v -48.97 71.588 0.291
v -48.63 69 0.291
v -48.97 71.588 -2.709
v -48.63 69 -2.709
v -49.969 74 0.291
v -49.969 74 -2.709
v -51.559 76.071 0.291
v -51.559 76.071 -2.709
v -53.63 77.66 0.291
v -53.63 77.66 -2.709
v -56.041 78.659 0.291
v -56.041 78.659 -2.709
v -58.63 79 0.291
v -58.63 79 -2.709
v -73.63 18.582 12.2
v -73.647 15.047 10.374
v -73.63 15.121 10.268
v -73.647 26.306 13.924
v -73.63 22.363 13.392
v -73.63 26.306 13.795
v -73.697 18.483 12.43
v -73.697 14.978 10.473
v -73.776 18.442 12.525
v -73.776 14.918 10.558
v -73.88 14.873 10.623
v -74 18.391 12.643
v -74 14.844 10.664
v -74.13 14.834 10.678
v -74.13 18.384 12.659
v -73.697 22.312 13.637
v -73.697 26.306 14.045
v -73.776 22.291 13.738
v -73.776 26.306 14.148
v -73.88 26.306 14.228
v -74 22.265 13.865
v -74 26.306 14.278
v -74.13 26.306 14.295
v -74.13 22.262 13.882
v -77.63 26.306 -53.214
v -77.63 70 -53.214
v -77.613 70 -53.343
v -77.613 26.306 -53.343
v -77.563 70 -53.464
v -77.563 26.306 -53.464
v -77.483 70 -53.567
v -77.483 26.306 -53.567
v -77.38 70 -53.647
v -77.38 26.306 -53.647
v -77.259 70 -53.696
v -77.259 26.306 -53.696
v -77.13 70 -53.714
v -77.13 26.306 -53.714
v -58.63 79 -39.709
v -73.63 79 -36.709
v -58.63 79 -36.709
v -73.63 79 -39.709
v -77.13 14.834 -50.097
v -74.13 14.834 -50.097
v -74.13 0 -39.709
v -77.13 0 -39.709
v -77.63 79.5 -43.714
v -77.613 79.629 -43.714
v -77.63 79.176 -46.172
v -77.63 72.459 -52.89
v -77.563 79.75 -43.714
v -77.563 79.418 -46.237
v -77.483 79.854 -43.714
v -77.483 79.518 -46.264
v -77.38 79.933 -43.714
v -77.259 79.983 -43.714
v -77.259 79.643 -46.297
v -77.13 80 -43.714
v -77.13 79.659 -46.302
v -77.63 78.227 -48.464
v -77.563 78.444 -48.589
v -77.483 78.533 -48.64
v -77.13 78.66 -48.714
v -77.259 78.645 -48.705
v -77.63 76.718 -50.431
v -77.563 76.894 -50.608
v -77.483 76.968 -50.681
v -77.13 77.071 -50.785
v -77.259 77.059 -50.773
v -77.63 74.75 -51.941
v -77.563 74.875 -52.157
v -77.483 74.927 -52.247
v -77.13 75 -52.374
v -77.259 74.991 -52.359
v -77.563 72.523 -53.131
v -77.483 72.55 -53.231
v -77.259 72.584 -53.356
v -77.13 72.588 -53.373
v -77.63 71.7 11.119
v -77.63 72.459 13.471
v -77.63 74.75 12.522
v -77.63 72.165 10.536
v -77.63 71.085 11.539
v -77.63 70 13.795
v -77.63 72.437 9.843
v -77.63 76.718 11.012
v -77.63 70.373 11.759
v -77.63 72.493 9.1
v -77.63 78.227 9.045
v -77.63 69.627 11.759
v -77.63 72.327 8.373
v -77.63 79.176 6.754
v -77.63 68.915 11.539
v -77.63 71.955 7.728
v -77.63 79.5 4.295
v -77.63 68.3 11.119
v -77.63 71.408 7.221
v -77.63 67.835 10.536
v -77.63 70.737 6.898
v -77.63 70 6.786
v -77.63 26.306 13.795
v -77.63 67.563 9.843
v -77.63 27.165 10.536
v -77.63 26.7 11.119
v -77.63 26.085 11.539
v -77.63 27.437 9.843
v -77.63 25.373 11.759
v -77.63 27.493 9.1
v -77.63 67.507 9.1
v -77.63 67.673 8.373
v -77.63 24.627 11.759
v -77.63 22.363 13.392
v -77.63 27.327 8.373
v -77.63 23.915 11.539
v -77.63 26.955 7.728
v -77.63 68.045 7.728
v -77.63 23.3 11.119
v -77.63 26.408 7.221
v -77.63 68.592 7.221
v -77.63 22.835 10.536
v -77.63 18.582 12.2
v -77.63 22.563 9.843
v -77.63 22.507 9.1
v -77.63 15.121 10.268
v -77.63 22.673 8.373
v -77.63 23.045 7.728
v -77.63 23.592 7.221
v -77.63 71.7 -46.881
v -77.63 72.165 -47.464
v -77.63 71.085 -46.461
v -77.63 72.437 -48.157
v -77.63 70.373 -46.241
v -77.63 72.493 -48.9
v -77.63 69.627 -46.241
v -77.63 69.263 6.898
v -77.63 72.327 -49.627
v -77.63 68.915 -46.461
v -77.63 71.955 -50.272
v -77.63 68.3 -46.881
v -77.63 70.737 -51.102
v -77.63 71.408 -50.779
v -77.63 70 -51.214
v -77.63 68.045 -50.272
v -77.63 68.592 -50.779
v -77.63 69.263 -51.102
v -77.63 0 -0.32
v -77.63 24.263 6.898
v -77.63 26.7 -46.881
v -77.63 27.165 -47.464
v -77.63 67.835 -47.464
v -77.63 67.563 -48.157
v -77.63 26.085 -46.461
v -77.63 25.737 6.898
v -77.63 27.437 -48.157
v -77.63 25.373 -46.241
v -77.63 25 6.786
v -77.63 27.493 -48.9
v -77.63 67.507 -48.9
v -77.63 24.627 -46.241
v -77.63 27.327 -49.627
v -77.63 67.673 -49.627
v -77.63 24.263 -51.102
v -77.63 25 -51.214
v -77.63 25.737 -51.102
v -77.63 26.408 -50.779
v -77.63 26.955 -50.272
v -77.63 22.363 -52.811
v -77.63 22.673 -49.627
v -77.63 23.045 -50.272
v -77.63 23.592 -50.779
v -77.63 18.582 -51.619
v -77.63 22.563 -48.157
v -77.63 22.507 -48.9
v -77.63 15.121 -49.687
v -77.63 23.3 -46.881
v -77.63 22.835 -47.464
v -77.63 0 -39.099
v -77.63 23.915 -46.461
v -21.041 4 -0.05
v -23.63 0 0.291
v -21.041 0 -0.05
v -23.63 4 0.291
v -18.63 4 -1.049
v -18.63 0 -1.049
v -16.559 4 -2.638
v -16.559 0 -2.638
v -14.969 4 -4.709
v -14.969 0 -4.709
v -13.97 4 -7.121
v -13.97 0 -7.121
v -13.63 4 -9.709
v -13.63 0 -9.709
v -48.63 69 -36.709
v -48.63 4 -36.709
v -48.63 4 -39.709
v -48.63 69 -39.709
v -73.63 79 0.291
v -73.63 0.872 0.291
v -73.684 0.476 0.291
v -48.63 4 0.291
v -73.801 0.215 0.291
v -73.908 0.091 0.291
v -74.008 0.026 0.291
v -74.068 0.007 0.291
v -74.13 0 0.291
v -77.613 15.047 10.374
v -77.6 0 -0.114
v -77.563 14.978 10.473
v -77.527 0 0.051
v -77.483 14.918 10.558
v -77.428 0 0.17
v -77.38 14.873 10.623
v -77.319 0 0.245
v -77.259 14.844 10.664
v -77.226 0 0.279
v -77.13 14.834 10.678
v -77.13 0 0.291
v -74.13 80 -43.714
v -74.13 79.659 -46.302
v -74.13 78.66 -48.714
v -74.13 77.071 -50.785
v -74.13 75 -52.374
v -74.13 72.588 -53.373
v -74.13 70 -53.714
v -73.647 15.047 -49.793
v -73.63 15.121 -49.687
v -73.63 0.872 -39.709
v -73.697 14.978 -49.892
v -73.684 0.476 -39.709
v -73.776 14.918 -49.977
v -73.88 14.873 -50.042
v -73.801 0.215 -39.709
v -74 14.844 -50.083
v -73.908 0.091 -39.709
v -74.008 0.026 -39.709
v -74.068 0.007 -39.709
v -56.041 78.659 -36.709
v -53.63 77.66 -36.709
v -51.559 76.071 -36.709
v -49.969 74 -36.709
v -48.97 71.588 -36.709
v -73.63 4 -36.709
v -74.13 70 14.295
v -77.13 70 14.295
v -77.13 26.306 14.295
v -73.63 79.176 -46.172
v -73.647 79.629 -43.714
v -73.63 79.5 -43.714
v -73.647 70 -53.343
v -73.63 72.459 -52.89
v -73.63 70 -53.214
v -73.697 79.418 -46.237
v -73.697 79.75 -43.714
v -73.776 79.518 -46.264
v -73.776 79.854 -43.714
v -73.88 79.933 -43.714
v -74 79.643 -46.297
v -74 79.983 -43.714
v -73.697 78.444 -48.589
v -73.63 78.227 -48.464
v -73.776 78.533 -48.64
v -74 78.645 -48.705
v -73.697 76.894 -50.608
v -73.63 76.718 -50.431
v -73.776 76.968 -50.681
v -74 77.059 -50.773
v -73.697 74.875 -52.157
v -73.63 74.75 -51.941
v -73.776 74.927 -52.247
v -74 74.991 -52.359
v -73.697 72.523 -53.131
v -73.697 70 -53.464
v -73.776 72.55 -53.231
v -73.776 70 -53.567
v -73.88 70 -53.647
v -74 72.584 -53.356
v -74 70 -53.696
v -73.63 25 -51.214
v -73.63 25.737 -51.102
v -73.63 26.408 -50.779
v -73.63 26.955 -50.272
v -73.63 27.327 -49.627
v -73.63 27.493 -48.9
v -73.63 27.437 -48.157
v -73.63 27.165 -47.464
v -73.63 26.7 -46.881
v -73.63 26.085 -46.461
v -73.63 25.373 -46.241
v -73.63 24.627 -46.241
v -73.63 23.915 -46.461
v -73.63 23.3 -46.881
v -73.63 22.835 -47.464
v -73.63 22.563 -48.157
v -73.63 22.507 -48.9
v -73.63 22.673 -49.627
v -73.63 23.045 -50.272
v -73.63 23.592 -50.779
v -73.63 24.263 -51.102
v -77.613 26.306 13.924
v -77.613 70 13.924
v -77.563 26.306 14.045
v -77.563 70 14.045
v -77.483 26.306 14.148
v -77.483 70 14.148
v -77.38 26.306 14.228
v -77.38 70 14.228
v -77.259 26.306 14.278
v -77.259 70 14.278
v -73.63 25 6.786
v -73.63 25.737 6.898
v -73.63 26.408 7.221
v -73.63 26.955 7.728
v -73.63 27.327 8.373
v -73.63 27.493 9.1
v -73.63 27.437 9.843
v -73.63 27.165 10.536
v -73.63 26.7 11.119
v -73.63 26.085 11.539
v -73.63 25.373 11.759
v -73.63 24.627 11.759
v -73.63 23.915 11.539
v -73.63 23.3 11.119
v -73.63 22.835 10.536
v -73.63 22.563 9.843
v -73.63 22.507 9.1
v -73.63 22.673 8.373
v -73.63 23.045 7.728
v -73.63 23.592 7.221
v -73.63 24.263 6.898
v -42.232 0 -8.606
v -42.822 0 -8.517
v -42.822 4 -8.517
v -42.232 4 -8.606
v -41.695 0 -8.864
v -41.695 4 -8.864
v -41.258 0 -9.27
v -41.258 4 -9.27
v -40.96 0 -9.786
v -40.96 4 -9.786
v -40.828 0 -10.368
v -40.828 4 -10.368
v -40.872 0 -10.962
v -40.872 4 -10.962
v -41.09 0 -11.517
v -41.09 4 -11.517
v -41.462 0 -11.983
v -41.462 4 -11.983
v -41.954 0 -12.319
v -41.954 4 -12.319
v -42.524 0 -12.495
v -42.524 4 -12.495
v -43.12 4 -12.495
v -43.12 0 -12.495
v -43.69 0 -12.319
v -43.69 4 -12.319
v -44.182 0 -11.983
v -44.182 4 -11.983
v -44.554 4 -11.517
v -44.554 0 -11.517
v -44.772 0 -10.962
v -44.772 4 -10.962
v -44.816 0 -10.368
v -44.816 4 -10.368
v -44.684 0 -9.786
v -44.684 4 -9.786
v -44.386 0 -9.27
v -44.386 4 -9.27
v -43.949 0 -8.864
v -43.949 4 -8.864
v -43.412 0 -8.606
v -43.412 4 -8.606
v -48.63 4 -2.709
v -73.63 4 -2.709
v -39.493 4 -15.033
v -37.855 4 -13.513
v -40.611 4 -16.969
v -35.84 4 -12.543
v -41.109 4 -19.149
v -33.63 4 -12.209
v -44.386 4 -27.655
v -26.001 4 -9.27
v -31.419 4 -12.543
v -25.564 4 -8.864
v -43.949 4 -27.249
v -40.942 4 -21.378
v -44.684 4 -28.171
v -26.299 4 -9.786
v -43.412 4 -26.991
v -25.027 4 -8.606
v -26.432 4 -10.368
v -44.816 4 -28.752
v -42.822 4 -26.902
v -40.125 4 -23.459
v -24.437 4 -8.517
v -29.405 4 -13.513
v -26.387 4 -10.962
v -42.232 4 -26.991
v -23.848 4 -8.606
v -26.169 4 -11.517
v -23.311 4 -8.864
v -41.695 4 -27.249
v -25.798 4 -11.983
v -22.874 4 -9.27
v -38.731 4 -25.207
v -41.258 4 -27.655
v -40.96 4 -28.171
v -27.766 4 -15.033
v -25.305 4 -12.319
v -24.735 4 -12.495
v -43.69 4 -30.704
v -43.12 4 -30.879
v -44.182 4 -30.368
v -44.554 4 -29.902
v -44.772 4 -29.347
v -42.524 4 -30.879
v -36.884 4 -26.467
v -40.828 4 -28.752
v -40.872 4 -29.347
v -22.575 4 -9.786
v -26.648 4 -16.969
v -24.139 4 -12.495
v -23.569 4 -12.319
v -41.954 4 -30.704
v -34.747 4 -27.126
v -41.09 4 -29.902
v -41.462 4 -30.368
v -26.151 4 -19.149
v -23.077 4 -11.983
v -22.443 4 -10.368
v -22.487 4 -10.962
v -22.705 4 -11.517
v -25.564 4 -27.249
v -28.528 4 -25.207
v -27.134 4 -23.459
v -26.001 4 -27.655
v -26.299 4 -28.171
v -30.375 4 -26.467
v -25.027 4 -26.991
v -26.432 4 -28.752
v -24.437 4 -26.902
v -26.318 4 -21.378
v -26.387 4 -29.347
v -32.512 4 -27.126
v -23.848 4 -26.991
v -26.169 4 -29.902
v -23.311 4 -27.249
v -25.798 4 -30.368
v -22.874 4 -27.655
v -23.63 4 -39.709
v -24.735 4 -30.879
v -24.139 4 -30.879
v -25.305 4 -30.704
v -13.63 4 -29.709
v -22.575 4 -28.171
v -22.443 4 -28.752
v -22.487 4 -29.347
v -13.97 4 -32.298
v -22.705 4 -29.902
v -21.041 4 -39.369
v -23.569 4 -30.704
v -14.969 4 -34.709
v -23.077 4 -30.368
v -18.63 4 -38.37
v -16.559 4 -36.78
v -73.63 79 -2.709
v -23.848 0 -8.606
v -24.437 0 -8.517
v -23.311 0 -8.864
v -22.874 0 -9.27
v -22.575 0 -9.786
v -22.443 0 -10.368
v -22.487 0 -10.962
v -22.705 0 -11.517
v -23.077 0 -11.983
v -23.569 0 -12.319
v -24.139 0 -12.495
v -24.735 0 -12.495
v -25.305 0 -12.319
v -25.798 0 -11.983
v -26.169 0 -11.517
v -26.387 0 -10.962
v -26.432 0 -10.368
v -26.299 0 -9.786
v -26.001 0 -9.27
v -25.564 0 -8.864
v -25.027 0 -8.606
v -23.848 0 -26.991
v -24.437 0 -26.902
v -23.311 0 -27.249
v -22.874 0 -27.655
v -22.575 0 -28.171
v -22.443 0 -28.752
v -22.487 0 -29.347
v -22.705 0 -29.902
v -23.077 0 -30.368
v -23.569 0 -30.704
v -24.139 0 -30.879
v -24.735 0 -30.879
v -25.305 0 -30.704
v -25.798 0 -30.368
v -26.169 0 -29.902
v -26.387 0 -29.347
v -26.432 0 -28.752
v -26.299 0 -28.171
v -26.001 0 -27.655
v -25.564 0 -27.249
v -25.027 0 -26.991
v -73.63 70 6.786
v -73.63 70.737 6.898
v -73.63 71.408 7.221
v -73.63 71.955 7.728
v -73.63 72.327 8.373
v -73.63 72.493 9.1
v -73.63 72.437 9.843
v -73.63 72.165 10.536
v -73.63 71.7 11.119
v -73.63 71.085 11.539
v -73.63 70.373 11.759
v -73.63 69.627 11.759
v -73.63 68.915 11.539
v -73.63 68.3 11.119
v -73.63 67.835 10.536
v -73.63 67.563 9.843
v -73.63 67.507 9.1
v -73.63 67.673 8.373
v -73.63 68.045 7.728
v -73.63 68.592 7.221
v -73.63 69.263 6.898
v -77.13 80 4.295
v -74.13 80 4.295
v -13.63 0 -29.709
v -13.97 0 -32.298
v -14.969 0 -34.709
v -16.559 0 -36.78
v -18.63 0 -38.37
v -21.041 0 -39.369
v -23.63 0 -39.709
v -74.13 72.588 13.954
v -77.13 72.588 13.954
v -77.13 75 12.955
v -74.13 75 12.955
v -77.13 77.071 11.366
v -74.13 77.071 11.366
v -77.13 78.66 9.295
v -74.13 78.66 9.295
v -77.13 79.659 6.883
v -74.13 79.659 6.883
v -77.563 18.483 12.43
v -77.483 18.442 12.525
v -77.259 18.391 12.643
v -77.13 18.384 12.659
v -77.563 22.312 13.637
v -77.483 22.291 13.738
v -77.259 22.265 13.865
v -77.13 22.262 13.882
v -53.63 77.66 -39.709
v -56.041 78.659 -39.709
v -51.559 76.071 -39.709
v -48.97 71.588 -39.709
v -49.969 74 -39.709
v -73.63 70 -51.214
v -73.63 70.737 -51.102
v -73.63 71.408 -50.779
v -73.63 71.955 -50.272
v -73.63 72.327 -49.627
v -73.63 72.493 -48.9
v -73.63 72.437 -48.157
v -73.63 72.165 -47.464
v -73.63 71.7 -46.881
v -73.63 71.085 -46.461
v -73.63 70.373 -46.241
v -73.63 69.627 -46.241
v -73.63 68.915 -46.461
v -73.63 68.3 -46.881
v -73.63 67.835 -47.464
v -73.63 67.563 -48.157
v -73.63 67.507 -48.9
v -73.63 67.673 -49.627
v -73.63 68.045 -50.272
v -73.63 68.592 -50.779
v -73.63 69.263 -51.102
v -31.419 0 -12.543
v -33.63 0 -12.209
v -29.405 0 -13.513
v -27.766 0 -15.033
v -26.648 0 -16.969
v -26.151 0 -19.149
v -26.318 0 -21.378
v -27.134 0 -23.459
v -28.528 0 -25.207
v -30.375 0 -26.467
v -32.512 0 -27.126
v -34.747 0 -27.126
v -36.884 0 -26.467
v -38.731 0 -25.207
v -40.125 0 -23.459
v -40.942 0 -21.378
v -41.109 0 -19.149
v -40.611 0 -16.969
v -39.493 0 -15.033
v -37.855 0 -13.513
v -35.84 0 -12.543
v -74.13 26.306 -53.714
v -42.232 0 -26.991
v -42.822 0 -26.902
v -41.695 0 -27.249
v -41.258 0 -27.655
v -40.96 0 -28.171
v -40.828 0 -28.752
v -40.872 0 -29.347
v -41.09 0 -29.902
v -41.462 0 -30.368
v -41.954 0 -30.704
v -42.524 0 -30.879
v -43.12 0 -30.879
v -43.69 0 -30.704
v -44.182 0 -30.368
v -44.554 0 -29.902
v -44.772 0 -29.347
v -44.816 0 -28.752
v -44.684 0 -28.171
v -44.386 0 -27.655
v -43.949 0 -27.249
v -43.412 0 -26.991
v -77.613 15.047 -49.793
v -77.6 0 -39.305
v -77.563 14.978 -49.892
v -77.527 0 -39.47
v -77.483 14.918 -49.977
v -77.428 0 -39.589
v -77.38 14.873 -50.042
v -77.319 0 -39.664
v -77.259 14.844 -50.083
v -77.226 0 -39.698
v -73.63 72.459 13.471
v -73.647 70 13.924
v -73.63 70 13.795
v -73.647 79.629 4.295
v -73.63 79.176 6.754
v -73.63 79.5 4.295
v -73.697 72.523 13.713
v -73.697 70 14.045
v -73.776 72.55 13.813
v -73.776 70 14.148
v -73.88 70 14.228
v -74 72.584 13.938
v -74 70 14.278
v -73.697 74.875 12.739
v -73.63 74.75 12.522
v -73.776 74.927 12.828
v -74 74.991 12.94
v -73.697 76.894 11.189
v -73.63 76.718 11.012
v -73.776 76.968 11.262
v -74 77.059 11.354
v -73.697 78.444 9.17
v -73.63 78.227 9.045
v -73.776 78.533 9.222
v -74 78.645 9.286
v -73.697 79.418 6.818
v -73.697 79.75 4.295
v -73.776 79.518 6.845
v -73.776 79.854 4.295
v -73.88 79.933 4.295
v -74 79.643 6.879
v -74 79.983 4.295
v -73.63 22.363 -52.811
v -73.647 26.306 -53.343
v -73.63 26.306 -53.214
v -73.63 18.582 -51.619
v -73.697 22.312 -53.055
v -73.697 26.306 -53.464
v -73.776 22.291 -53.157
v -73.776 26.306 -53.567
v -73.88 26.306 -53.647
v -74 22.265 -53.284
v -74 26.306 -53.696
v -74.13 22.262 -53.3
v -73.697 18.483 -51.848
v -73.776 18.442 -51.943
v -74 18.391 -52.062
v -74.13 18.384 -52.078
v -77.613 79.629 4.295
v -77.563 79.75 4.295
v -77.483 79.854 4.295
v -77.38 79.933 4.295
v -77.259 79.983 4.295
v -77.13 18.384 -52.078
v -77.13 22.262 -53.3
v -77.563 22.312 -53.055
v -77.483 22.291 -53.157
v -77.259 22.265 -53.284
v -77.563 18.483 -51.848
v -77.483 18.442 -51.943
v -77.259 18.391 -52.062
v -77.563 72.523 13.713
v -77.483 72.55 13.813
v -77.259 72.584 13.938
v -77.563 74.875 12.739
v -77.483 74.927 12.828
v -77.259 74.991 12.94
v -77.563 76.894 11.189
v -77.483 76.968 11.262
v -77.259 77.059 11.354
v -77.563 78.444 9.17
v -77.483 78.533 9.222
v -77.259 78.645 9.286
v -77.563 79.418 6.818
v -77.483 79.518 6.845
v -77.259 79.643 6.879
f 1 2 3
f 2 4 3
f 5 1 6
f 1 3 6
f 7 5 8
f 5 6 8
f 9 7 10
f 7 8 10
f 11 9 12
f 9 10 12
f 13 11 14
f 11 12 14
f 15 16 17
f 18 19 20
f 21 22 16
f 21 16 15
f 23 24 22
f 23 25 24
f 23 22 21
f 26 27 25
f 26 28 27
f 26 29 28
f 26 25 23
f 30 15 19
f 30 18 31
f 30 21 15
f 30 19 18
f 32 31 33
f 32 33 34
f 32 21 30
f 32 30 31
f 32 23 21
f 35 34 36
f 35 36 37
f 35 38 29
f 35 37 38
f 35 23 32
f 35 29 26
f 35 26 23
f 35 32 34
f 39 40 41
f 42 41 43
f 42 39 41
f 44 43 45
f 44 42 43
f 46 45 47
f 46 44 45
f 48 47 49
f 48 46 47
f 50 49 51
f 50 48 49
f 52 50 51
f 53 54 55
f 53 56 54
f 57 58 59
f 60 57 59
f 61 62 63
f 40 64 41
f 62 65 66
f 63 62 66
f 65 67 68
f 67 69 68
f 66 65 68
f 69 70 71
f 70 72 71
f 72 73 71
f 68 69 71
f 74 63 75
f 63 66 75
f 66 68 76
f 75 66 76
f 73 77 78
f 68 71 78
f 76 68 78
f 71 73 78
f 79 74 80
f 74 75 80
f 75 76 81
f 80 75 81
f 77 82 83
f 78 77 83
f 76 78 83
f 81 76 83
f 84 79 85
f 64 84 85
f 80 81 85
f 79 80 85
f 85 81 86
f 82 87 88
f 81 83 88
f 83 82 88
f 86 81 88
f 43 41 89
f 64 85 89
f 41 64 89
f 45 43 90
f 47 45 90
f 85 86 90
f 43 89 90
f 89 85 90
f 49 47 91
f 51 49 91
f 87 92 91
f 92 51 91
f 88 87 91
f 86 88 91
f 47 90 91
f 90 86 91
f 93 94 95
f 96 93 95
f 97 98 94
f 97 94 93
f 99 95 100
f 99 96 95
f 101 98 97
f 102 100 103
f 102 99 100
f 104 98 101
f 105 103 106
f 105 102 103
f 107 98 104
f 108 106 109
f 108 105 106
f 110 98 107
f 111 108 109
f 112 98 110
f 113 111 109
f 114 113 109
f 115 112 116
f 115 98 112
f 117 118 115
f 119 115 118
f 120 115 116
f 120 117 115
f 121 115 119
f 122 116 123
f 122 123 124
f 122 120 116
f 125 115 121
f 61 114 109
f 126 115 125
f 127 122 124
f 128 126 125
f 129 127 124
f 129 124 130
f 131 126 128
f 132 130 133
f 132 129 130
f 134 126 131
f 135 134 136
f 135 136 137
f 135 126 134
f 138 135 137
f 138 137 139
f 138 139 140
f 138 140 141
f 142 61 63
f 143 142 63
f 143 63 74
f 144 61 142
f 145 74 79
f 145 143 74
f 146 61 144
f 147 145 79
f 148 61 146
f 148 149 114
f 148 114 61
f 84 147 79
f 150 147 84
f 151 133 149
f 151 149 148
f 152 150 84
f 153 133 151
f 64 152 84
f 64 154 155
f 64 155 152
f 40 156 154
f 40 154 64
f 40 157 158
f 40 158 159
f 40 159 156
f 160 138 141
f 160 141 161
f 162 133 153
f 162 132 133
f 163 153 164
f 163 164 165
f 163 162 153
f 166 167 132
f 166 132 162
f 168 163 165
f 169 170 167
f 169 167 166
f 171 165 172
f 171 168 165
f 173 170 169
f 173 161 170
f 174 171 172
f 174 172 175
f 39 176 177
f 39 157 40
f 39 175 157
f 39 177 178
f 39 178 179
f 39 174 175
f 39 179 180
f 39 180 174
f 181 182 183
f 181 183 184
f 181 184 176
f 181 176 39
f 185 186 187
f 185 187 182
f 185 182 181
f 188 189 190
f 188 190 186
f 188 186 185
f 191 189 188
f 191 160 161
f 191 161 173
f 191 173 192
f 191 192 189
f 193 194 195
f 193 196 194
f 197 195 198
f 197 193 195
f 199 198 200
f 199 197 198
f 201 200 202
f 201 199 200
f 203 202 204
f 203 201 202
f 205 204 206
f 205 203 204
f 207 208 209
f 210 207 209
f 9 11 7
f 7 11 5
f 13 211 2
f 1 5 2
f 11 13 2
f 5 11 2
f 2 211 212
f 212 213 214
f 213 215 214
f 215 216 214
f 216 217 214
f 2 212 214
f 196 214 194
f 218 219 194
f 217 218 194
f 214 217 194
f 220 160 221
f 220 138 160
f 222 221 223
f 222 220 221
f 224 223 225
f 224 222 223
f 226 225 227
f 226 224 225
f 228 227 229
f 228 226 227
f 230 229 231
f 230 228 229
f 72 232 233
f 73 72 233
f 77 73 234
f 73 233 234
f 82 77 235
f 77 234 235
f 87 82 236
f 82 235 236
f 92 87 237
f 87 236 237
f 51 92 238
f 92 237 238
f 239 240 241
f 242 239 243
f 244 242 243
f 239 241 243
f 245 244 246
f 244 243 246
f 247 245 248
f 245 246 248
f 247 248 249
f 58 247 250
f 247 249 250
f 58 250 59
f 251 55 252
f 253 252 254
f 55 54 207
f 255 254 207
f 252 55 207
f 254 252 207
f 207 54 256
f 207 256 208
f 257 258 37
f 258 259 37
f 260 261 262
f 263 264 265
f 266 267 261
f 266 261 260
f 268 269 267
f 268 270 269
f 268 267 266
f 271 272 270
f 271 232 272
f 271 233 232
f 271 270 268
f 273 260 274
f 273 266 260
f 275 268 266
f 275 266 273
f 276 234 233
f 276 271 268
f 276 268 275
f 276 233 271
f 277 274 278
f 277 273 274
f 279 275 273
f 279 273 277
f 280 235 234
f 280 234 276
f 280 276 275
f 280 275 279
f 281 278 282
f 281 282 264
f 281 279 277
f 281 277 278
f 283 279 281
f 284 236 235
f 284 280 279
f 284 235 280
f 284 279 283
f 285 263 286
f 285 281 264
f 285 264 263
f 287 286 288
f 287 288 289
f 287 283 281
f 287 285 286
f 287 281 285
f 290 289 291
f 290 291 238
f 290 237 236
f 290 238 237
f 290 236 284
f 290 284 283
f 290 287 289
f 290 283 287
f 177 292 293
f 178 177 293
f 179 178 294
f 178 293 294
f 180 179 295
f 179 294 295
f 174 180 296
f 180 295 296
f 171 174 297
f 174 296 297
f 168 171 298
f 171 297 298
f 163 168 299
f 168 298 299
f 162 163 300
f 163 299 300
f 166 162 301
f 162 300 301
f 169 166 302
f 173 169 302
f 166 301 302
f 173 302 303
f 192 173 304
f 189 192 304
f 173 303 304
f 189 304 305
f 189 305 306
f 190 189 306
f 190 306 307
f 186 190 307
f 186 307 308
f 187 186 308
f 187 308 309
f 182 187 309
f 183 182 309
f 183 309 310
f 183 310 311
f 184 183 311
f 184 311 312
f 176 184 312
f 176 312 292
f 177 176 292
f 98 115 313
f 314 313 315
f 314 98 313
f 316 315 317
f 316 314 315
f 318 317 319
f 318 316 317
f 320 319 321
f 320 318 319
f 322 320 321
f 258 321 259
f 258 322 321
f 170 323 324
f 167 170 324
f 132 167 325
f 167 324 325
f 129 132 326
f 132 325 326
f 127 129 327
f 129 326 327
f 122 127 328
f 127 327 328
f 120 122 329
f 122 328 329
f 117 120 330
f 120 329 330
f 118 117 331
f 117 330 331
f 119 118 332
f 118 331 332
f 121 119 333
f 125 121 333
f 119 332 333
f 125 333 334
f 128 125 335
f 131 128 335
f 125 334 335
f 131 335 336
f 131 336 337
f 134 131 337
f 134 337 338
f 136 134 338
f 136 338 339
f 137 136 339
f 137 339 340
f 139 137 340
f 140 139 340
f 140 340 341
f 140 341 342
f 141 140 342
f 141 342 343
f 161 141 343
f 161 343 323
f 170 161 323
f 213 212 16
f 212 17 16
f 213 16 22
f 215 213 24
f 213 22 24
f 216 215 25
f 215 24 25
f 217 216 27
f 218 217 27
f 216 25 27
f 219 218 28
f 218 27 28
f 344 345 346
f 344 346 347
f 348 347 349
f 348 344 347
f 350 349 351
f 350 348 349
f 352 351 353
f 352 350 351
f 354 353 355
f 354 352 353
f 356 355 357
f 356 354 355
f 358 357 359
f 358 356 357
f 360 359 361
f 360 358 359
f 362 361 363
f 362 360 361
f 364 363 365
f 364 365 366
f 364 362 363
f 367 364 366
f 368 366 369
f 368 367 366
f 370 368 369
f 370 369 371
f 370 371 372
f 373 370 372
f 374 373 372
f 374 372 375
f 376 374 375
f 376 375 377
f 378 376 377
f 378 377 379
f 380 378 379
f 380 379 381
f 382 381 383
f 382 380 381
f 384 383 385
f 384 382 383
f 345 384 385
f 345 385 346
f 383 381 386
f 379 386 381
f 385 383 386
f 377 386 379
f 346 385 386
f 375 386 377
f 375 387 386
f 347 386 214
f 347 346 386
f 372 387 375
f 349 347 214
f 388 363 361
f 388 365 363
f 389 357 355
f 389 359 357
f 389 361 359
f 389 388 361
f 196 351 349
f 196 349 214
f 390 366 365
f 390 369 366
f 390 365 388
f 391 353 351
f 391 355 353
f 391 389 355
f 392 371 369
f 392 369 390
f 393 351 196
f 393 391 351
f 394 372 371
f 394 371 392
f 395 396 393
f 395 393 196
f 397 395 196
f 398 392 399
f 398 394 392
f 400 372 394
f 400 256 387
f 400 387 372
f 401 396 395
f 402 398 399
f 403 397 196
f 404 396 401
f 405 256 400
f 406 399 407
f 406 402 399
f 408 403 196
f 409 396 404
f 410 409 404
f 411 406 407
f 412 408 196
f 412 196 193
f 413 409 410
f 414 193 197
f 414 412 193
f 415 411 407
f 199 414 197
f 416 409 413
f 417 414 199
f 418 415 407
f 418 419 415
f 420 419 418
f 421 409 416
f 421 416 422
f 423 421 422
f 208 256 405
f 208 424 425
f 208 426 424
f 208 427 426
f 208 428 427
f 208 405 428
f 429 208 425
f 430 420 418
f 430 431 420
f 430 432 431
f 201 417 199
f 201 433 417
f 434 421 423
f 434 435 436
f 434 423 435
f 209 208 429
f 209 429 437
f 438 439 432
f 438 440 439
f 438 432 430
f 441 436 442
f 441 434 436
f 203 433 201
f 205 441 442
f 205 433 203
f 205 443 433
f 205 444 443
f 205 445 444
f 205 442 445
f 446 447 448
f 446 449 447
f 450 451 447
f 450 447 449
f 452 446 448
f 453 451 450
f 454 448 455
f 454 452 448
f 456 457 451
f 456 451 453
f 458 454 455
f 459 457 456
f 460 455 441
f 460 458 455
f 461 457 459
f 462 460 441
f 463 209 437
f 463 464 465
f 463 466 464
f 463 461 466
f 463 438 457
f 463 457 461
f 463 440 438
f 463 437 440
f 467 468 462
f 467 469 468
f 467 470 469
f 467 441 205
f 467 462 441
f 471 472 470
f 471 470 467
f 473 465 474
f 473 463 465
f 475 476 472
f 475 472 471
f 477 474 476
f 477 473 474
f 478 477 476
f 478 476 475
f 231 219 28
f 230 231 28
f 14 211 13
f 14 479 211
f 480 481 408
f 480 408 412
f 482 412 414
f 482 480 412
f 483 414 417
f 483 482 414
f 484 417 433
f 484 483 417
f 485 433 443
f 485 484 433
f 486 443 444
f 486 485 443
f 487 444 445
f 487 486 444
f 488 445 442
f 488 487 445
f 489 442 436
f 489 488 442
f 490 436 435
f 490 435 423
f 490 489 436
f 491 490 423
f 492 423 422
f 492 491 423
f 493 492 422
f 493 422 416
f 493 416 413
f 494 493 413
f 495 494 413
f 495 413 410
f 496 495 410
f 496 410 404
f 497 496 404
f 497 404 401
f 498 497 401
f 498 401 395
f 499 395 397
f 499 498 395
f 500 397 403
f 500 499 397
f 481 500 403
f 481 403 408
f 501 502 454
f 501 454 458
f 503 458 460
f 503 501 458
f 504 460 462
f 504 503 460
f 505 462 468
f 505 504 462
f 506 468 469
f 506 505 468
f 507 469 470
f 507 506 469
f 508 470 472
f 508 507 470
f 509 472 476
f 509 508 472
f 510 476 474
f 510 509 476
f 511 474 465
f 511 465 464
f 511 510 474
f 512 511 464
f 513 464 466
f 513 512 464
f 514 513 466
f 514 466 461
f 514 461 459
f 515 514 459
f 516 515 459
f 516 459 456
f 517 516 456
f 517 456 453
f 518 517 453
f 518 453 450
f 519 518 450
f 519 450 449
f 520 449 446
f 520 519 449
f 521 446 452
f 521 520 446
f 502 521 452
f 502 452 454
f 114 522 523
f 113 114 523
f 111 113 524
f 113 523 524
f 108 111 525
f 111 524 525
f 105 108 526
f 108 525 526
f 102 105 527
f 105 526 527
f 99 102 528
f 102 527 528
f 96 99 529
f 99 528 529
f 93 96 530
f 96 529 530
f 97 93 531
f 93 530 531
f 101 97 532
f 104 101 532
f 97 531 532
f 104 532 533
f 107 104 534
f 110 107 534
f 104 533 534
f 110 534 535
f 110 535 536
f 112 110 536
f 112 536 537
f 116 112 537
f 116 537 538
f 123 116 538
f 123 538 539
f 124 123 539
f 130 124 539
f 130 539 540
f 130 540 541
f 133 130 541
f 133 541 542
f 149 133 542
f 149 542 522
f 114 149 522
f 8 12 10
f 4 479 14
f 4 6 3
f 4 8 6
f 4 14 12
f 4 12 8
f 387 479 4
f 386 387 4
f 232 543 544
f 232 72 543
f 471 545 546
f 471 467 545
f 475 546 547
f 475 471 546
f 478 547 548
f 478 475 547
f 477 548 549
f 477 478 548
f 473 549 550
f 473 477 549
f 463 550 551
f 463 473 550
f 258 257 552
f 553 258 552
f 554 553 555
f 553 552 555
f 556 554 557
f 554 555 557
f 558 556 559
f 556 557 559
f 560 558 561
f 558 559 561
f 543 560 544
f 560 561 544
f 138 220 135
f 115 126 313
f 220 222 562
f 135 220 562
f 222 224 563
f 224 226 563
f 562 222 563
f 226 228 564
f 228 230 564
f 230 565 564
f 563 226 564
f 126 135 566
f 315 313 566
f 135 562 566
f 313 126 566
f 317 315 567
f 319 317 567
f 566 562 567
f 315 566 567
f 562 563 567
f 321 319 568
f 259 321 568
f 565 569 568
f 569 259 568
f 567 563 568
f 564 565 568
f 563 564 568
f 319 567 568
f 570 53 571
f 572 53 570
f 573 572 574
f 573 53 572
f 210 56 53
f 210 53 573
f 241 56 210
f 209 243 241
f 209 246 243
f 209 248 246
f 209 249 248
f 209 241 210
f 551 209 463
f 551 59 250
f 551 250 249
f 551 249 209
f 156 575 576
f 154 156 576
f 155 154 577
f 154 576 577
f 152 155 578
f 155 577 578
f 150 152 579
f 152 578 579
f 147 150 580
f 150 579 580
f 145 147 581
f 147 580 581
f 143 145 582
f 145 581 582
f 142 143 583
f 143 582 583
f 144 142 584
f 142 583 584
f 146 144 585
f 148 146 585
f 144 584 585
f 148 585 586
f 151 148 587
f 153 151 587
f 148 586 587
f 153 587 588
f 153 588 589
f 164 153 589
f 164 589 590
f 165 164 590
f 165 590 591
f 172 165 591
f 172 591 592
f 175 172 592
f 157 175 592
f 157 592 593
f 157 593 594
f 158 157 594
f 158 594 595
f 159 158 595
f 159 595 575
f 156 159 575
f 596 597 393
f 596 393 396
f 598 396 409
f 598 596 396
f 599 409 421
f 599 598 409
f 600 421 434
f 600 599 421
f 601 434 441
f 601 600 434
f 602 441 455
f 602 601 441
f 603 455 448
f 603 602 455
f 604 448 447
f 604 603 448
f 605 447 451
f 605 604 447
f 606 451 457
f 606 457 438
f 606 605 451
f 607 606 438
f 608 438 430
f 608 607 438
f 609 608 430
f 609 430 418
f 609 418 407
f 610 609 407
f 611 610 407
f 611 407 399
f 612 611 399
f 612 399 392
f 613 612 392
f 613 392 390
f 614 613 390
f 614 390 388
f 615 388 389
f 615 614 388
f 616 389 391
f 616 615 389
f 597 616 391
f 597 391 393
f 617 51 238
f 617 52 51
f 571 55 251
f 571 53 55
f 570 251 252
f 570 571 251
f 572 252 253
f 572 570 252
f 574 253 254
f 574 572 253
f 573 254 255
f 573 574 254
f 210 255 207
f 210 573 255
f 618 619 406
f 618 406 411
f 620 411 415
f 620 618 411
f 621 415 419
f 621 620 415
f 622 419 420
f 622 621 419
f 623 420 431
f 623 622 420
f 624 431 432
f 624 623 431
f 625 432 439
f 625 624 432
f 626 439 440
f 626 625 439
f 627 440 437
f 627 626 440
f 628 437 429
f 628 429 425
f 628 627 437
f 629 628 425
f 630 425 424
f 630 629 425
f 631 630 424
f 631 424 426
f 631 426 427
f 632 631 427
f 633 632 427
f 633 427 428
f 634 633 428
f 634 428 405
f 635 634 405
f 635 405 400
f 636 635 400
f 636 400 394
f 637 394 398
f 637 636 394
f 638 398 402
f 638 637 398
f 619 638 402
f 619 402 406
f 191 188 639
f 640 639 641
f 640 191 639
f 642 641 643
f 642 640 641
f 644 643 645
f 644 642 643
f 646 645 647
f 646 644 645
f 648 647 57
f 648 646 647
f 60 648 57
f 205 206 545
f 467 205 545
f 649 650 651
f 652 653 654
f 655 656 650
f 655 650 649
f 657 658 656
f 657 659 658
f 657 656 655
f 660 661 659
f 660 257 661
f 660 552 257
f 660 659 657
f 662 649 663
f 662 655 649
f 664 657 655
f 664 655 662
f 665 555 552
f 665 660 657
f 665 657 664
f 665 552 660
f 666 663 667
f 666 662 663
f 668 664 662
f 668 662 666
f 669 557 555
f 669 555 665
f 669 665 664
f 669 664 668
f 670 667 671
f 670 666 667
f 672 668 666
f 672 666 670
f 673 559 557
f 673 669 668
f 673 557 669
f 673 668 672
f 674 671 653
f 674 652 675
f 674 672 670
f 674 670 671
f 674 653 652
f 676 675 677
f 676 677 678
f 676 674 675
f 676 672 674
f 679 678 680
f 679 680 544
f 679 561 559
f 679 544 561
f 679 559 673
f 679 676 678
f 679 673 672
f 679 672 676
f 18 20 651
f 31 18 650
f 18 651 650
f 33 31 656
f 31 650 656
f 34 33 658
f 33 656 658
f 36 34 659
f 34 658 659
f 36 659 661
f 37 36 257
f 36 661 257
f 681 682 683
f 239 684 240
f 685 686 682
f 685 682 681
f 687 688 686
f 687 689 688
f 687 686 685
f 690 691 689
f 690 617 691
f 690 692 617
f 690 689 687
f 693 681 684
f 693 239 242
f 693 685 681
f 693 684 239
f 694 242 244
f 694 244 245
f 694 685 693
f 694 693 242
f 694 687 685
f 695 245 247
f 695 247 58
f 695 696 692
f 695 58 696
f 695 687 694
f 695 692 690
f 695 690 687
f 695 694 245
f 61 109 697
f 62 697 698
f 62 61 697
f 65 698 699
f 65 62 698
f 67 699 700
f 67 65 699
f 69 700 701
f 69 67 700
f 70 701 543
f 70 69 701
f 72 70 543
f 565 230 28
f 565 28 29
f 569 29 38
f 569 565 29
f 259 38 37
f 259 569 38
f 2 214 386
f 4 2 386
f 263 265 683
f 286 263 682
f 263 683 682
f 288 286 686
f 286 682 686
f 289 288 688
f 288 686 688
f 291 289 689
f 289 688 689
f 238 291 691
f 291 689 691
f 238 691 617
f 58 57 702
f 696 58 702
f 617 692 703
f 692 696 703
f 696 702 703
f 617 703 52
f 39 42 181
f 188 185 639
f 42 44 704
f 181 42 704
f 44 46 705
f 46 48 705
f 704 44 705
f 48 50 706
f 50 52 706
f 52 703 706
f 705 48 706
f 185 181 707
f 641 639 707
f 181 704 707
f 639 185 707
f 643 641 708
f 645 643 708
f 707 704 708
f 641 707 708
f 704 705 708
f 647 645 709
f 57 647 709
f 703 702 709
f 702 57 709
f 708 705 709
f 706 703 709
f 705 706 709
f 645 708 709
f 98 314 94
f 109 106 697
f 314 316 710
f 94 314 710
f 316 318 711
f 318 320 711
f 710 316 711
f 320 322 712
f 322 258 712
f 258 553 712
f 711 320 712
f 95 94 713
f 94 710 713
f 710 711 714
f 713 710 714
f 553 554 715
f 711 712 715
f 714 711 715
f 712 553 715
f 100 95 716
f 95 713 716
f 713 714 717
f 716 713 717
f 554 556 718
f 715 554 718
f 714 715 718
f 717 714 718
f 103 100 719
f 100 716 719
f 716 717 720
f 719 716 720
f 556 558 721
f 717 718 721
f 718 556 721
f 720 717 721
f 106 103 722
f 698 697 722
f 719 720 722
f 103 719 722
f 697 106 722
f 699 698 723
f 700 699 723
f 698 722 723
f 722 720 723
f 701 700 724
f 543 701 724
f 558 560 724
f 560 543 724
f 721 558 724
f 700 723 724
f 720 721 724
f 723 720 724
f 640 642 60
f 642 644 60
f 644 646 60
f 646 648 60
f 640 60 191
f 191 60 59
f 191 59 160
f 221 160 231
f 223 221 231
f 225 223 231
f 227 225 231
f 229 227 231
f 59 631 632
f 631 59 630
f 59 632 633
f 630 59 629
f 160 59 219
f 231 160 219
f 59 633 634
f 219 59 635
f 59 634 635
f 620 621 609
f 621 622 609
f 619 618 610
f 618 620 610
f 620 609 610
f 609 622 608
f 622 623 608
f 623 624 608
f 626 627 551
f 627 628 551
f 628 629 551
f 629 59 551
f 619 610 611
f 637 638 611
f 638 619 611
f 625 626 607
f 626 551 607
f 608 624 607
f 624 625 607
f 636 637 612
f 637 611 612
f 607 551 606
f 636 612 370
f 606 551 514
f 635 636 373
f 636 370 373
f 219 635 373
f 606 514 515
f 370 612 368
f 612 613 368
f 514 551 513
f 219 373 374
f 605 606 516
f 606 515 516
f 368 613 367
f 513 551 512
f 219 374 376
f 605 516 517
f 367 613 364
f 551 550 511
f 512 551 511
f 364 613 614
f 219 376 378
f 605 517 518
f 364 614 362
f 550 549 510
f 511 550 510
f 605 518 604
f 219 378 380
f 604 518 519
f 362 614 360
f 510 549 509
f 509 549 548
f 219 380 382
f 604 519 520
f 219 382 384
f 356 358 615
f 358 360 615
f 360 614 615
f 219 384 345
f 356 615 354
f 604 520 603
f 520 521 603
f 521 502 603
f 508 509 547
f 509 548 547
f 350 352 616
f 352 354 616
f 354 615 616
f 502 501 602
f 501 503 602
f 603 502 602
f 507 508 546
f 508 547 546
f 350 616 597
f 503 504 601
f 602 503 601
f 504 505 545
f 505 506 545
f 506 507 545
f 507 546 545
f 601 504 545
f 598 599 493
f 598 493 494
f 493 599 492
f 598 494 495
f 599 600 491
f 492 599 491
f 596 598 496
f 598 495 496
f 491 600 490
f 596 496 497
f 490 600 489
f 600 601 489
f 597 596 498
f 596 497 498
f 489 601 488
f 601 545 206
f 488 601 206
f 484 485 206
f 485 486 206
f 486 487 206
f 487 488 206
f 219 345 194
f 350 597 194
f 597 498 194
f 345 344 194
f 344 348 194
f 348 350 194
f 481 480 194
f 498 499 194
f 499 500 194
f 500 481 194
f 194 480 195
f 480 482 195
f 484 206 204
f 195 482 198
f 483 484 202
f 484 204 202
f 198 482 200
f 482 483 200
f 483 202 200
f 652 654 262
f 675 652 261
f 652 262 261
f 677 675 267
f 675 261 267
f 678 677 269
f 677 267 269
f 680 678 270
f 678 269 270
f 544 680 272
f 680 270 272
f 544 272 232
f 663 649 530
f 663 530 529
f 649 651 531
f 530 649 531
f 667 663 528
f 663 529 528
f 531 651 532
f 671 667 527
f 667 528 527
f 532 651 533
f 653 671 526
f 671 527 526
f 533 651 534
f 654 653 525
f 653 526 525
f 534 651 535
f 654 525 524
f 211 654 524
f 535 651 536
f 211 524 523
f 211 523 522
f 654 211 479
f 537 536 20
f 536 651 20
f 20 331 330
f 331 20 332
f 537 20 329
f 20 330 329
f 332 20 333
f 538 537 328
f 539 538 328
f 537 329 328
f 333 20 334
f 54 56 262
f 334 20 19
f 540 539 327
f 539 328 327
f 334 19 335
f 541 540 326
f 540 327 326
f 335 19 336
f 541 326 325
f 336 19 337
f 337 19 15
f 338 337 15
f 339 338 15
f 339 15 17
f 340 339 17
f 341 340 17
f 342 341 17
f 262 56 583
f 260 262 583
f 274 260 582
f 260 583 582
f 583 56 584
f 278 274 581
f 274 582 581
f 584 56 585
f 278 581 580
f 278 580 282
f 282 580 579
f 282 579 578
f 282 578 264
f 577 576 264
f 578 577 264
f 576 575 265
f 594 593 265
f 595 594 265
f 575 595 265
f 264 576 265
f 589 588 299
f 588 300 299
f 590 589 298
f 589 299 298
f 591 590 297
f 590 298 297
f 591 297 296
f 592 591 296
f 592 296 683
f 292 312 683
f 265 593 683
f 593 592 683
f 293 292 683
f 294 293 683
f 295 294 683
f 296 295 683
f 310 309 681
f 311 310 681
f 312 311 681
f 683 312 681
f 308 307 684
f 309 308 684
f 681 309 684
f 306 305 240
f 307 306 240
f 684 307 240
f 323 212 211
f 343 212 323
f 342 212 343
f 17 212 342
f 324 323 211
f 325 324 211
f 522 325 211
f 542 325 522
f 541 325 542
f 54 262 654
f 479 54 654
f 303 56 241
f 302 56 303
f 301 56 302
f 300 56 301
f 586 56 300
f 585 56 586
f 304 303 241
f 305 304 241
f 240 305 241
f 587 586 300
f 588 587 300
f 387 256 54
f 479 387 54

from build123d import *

# Parameters (mm, degrees)
SKETCH_1_W          = 60
SKETCH_1_H          = 40
SKETCH_1_R          = 7.5
SKETCH_1_R_2        = 2
EXTRUDE_1_DEPTH     = 4
EXTRUDE_2_DEPTH     = 4
SKETCH_6_W          = 4
SKETCH_6_H          = 68.008301528
EXTRUDE_3_DEPTH     = 60
SKETCH_7_R          = 2.5
CUT_EXTRUDE_1_DEPTH = 114.512737176
FILLET_1_R          = 10
FILLET_2_R          = 20
FILLET_4_R          = 10
FILLET_12_R         = 0.5
FILLET_13_R         = 0.5
SKETCH_10_W         = 25
SKETCH_10_H         = 3
EXTRUDE_6_DEPTH     = 75
FILLET_16_R         = 10


with BuildPart() as part:
    # 草图1 → 凸台-拉伸1 (new body)
    with BuildSketch(Plane(origin=(0, 0, 0), x_dir=(1, 0, 0), z_dir=(0, 1, 0))):
        with Locations((-43.629618652, 19.709362445)):
            Rectangle(SKETCH_1_W, SKETCH_1_H)
        with Locations(Location((-33.629618652, 19.709362445, 0), (0, 0, 270))):
            Circle(SKETCH_1_R, mode=Mode.SUBTRACT)
        with Locations(Location((-42.822006808, 28.9017506, 0), (0, 0, 270))):
            Circle(SKETCH_1_R_2, mode=Mode.SUBTRACT)
        with Locations(Location((-24.437230497, 28.9017506, 0), (0, 0, 270))):
            Circle(SKETCH_1_R_2, mode=Mode.SUBTRACT)
        with Locations(Location((-24.437230497, 10.516974289, 0), (0, 0, 270))):
            Circle(SKETCH_1_R_2, mode=Mode.SUBTRACT)
        with Locations(Location((-42.822006808, 10.516974289, 0), (0, 0, 270))):
            Circle(SKETCH_1_R_2, mode=Mode.SUBTRACT)
    extrude(amount=EXTRUDE_1_DEPTH)

    # 草图2 → 凸台-拉伸2 (add)
    with BuildSketch(Plane.ZY.offset(73.629618652)):
        Polygon((-53.713513209, 20), (-39.709362445, 0), (0.290637555, 0), (14.294788319, 20), align=None)
    extrude(amount=EXTRUDE_2_DEPTH)

    # 草图6 → 凸台-拉伸3 (add)
    with BuildSketch(Plane(origin=(0, 20, 0), x_dir=(1, 0, 0), z_dir=(0, 1, 0))):
        with Locations((-75.629618652, 19.709362445)):
            Rectangle(SKETCH_6_W, SKETCH_6_H)
    extrude(amount=EXTRUDE_3_DEPTH)

    # 草图7 → 切除-拉伸1 (cut, through all)
    with BuildSketch(Plane(origin=(-73.629618652, 0, 0), x_dir=(0, 0, -1), z_dir=(1, 0, 0))):
        with Locations((48.713513209, 25)):
            Circle(SKETCH_7_R)
        with Locations((-9.286486791, 25)):
            Circle(SKETCH_7_R)
        with Locations((48.713513209, 70)):
            Circle(SKETCH_7_R)
        with Locations((-9.286486791, 70)):
            Circle(SKETCH_7_R)
    extrude(amount=-CUT_EXTRUDE_1_DEPTH, mode=Mode.SUBTRACT)

    # 圆角1
    fillet_1_edges = [part.edges().sort_by_distance(p)[0] for p in [
        (-13.629618652, 2, -39.709362445),
        (-13.629618652, 2, 0.290637555),
    ]]
    fillet(fillet_1_edges, radius=FILLET_1_R)

    # 圆角2
    fillet_2_edges = [part.edges().sort_by_distance(p)[0] for p in [
        (-75.629618652, 20, 14.294788319),
        (-75.629618652, 20, -53.713513209),
    ]]
    fillet(fillet_2_edges, radius=FILLET_2_R)

    # 圆角4
    fillet_4_edges = [part.edges().sort_by_distance(p)[0] for p in [
        (-75.629618652, 80, -53.713513209),
        (-75.629618652, 80, 14.294788319),
    ]]
    fillet(fillet_4_edges, radius=FILLET_4_R)

    # 圆角12
    fillet_12_edges = [part.edges().sort_by_distance(p)[0] for p in [
        (-73.629618652, 80, -19.709362445),
        (-73.629618652, 48.152987889, -53.713513209),
        (-73.629618652, 48.152987889, 14.294788319),
        (-73.629618652, 77.071067812, -50.784581021),
        (-73.629618652, 77.071067812, 11.365856131),
        (-73.629618652, 7.417223525, 5.48423338),
        (-73.629618652, 7.417223525, -44.90295827),
        (-73.629618652, 20.291859787, 13.369127334),
        (-73.629618652, 20.291859787, -52.787852224),
    ]]
    fillet(fillet_12_edges, radius=FILLET_12_R)

    # 圆角13
    fillet_13_edges = [part.edges().sort_by_distance(p)[0] for p in [
        (-77.629618652, 80, -19.709362445),
        (-77.629618652, 48.152987889, 14.294788319),
        (-77.629618652, 48.152987889, -53.713513209),
        (-77.629618652, 77.071067812, -50.784581021),
        (-77.629618652, 77.071067812, 11.365856131),
        (-77.629618652, 7.417223525, 5.48423338),
        (-77.629618652, 7.417223525, -44.90295827),
        (-77.629618652, 20.291859787, 13.369127334),
        (-77.629618652, 20.291859787, -52.787852224),
    ]]
    fillet(fillet_13_edges, radius=FILLET_13_R)

    # 草图10 → 凸台-拉伸6 (add)
    with BuildSketch(Plane(origin=(0, 4, 0), x_dir=(1, 0, 0), z_dir=(0, 1, 0))):
        with Locations((-61.129618652, 38.209362445)):
            Rectangle(SKETCH_10_W, SKETCH_10_H)
        with Locations((-61.129618652, 1.209362445)):
            Rectangle(SKETCH_10_W, SKETCH_10_H)
    extrude(amount=EXTRUDE_6_DEPTH)

    # 圆角16
    fillet_16_edges = [part.edges().sort_by_distance(p)[0] for p in [
        (-48.629618652, 79, -38.209362445),
        (-48.629618652, 79, -1.209362445),
    ]]
    fillet(fillet_16_edges, radius=FILLET_16_R)


solid = part.part
